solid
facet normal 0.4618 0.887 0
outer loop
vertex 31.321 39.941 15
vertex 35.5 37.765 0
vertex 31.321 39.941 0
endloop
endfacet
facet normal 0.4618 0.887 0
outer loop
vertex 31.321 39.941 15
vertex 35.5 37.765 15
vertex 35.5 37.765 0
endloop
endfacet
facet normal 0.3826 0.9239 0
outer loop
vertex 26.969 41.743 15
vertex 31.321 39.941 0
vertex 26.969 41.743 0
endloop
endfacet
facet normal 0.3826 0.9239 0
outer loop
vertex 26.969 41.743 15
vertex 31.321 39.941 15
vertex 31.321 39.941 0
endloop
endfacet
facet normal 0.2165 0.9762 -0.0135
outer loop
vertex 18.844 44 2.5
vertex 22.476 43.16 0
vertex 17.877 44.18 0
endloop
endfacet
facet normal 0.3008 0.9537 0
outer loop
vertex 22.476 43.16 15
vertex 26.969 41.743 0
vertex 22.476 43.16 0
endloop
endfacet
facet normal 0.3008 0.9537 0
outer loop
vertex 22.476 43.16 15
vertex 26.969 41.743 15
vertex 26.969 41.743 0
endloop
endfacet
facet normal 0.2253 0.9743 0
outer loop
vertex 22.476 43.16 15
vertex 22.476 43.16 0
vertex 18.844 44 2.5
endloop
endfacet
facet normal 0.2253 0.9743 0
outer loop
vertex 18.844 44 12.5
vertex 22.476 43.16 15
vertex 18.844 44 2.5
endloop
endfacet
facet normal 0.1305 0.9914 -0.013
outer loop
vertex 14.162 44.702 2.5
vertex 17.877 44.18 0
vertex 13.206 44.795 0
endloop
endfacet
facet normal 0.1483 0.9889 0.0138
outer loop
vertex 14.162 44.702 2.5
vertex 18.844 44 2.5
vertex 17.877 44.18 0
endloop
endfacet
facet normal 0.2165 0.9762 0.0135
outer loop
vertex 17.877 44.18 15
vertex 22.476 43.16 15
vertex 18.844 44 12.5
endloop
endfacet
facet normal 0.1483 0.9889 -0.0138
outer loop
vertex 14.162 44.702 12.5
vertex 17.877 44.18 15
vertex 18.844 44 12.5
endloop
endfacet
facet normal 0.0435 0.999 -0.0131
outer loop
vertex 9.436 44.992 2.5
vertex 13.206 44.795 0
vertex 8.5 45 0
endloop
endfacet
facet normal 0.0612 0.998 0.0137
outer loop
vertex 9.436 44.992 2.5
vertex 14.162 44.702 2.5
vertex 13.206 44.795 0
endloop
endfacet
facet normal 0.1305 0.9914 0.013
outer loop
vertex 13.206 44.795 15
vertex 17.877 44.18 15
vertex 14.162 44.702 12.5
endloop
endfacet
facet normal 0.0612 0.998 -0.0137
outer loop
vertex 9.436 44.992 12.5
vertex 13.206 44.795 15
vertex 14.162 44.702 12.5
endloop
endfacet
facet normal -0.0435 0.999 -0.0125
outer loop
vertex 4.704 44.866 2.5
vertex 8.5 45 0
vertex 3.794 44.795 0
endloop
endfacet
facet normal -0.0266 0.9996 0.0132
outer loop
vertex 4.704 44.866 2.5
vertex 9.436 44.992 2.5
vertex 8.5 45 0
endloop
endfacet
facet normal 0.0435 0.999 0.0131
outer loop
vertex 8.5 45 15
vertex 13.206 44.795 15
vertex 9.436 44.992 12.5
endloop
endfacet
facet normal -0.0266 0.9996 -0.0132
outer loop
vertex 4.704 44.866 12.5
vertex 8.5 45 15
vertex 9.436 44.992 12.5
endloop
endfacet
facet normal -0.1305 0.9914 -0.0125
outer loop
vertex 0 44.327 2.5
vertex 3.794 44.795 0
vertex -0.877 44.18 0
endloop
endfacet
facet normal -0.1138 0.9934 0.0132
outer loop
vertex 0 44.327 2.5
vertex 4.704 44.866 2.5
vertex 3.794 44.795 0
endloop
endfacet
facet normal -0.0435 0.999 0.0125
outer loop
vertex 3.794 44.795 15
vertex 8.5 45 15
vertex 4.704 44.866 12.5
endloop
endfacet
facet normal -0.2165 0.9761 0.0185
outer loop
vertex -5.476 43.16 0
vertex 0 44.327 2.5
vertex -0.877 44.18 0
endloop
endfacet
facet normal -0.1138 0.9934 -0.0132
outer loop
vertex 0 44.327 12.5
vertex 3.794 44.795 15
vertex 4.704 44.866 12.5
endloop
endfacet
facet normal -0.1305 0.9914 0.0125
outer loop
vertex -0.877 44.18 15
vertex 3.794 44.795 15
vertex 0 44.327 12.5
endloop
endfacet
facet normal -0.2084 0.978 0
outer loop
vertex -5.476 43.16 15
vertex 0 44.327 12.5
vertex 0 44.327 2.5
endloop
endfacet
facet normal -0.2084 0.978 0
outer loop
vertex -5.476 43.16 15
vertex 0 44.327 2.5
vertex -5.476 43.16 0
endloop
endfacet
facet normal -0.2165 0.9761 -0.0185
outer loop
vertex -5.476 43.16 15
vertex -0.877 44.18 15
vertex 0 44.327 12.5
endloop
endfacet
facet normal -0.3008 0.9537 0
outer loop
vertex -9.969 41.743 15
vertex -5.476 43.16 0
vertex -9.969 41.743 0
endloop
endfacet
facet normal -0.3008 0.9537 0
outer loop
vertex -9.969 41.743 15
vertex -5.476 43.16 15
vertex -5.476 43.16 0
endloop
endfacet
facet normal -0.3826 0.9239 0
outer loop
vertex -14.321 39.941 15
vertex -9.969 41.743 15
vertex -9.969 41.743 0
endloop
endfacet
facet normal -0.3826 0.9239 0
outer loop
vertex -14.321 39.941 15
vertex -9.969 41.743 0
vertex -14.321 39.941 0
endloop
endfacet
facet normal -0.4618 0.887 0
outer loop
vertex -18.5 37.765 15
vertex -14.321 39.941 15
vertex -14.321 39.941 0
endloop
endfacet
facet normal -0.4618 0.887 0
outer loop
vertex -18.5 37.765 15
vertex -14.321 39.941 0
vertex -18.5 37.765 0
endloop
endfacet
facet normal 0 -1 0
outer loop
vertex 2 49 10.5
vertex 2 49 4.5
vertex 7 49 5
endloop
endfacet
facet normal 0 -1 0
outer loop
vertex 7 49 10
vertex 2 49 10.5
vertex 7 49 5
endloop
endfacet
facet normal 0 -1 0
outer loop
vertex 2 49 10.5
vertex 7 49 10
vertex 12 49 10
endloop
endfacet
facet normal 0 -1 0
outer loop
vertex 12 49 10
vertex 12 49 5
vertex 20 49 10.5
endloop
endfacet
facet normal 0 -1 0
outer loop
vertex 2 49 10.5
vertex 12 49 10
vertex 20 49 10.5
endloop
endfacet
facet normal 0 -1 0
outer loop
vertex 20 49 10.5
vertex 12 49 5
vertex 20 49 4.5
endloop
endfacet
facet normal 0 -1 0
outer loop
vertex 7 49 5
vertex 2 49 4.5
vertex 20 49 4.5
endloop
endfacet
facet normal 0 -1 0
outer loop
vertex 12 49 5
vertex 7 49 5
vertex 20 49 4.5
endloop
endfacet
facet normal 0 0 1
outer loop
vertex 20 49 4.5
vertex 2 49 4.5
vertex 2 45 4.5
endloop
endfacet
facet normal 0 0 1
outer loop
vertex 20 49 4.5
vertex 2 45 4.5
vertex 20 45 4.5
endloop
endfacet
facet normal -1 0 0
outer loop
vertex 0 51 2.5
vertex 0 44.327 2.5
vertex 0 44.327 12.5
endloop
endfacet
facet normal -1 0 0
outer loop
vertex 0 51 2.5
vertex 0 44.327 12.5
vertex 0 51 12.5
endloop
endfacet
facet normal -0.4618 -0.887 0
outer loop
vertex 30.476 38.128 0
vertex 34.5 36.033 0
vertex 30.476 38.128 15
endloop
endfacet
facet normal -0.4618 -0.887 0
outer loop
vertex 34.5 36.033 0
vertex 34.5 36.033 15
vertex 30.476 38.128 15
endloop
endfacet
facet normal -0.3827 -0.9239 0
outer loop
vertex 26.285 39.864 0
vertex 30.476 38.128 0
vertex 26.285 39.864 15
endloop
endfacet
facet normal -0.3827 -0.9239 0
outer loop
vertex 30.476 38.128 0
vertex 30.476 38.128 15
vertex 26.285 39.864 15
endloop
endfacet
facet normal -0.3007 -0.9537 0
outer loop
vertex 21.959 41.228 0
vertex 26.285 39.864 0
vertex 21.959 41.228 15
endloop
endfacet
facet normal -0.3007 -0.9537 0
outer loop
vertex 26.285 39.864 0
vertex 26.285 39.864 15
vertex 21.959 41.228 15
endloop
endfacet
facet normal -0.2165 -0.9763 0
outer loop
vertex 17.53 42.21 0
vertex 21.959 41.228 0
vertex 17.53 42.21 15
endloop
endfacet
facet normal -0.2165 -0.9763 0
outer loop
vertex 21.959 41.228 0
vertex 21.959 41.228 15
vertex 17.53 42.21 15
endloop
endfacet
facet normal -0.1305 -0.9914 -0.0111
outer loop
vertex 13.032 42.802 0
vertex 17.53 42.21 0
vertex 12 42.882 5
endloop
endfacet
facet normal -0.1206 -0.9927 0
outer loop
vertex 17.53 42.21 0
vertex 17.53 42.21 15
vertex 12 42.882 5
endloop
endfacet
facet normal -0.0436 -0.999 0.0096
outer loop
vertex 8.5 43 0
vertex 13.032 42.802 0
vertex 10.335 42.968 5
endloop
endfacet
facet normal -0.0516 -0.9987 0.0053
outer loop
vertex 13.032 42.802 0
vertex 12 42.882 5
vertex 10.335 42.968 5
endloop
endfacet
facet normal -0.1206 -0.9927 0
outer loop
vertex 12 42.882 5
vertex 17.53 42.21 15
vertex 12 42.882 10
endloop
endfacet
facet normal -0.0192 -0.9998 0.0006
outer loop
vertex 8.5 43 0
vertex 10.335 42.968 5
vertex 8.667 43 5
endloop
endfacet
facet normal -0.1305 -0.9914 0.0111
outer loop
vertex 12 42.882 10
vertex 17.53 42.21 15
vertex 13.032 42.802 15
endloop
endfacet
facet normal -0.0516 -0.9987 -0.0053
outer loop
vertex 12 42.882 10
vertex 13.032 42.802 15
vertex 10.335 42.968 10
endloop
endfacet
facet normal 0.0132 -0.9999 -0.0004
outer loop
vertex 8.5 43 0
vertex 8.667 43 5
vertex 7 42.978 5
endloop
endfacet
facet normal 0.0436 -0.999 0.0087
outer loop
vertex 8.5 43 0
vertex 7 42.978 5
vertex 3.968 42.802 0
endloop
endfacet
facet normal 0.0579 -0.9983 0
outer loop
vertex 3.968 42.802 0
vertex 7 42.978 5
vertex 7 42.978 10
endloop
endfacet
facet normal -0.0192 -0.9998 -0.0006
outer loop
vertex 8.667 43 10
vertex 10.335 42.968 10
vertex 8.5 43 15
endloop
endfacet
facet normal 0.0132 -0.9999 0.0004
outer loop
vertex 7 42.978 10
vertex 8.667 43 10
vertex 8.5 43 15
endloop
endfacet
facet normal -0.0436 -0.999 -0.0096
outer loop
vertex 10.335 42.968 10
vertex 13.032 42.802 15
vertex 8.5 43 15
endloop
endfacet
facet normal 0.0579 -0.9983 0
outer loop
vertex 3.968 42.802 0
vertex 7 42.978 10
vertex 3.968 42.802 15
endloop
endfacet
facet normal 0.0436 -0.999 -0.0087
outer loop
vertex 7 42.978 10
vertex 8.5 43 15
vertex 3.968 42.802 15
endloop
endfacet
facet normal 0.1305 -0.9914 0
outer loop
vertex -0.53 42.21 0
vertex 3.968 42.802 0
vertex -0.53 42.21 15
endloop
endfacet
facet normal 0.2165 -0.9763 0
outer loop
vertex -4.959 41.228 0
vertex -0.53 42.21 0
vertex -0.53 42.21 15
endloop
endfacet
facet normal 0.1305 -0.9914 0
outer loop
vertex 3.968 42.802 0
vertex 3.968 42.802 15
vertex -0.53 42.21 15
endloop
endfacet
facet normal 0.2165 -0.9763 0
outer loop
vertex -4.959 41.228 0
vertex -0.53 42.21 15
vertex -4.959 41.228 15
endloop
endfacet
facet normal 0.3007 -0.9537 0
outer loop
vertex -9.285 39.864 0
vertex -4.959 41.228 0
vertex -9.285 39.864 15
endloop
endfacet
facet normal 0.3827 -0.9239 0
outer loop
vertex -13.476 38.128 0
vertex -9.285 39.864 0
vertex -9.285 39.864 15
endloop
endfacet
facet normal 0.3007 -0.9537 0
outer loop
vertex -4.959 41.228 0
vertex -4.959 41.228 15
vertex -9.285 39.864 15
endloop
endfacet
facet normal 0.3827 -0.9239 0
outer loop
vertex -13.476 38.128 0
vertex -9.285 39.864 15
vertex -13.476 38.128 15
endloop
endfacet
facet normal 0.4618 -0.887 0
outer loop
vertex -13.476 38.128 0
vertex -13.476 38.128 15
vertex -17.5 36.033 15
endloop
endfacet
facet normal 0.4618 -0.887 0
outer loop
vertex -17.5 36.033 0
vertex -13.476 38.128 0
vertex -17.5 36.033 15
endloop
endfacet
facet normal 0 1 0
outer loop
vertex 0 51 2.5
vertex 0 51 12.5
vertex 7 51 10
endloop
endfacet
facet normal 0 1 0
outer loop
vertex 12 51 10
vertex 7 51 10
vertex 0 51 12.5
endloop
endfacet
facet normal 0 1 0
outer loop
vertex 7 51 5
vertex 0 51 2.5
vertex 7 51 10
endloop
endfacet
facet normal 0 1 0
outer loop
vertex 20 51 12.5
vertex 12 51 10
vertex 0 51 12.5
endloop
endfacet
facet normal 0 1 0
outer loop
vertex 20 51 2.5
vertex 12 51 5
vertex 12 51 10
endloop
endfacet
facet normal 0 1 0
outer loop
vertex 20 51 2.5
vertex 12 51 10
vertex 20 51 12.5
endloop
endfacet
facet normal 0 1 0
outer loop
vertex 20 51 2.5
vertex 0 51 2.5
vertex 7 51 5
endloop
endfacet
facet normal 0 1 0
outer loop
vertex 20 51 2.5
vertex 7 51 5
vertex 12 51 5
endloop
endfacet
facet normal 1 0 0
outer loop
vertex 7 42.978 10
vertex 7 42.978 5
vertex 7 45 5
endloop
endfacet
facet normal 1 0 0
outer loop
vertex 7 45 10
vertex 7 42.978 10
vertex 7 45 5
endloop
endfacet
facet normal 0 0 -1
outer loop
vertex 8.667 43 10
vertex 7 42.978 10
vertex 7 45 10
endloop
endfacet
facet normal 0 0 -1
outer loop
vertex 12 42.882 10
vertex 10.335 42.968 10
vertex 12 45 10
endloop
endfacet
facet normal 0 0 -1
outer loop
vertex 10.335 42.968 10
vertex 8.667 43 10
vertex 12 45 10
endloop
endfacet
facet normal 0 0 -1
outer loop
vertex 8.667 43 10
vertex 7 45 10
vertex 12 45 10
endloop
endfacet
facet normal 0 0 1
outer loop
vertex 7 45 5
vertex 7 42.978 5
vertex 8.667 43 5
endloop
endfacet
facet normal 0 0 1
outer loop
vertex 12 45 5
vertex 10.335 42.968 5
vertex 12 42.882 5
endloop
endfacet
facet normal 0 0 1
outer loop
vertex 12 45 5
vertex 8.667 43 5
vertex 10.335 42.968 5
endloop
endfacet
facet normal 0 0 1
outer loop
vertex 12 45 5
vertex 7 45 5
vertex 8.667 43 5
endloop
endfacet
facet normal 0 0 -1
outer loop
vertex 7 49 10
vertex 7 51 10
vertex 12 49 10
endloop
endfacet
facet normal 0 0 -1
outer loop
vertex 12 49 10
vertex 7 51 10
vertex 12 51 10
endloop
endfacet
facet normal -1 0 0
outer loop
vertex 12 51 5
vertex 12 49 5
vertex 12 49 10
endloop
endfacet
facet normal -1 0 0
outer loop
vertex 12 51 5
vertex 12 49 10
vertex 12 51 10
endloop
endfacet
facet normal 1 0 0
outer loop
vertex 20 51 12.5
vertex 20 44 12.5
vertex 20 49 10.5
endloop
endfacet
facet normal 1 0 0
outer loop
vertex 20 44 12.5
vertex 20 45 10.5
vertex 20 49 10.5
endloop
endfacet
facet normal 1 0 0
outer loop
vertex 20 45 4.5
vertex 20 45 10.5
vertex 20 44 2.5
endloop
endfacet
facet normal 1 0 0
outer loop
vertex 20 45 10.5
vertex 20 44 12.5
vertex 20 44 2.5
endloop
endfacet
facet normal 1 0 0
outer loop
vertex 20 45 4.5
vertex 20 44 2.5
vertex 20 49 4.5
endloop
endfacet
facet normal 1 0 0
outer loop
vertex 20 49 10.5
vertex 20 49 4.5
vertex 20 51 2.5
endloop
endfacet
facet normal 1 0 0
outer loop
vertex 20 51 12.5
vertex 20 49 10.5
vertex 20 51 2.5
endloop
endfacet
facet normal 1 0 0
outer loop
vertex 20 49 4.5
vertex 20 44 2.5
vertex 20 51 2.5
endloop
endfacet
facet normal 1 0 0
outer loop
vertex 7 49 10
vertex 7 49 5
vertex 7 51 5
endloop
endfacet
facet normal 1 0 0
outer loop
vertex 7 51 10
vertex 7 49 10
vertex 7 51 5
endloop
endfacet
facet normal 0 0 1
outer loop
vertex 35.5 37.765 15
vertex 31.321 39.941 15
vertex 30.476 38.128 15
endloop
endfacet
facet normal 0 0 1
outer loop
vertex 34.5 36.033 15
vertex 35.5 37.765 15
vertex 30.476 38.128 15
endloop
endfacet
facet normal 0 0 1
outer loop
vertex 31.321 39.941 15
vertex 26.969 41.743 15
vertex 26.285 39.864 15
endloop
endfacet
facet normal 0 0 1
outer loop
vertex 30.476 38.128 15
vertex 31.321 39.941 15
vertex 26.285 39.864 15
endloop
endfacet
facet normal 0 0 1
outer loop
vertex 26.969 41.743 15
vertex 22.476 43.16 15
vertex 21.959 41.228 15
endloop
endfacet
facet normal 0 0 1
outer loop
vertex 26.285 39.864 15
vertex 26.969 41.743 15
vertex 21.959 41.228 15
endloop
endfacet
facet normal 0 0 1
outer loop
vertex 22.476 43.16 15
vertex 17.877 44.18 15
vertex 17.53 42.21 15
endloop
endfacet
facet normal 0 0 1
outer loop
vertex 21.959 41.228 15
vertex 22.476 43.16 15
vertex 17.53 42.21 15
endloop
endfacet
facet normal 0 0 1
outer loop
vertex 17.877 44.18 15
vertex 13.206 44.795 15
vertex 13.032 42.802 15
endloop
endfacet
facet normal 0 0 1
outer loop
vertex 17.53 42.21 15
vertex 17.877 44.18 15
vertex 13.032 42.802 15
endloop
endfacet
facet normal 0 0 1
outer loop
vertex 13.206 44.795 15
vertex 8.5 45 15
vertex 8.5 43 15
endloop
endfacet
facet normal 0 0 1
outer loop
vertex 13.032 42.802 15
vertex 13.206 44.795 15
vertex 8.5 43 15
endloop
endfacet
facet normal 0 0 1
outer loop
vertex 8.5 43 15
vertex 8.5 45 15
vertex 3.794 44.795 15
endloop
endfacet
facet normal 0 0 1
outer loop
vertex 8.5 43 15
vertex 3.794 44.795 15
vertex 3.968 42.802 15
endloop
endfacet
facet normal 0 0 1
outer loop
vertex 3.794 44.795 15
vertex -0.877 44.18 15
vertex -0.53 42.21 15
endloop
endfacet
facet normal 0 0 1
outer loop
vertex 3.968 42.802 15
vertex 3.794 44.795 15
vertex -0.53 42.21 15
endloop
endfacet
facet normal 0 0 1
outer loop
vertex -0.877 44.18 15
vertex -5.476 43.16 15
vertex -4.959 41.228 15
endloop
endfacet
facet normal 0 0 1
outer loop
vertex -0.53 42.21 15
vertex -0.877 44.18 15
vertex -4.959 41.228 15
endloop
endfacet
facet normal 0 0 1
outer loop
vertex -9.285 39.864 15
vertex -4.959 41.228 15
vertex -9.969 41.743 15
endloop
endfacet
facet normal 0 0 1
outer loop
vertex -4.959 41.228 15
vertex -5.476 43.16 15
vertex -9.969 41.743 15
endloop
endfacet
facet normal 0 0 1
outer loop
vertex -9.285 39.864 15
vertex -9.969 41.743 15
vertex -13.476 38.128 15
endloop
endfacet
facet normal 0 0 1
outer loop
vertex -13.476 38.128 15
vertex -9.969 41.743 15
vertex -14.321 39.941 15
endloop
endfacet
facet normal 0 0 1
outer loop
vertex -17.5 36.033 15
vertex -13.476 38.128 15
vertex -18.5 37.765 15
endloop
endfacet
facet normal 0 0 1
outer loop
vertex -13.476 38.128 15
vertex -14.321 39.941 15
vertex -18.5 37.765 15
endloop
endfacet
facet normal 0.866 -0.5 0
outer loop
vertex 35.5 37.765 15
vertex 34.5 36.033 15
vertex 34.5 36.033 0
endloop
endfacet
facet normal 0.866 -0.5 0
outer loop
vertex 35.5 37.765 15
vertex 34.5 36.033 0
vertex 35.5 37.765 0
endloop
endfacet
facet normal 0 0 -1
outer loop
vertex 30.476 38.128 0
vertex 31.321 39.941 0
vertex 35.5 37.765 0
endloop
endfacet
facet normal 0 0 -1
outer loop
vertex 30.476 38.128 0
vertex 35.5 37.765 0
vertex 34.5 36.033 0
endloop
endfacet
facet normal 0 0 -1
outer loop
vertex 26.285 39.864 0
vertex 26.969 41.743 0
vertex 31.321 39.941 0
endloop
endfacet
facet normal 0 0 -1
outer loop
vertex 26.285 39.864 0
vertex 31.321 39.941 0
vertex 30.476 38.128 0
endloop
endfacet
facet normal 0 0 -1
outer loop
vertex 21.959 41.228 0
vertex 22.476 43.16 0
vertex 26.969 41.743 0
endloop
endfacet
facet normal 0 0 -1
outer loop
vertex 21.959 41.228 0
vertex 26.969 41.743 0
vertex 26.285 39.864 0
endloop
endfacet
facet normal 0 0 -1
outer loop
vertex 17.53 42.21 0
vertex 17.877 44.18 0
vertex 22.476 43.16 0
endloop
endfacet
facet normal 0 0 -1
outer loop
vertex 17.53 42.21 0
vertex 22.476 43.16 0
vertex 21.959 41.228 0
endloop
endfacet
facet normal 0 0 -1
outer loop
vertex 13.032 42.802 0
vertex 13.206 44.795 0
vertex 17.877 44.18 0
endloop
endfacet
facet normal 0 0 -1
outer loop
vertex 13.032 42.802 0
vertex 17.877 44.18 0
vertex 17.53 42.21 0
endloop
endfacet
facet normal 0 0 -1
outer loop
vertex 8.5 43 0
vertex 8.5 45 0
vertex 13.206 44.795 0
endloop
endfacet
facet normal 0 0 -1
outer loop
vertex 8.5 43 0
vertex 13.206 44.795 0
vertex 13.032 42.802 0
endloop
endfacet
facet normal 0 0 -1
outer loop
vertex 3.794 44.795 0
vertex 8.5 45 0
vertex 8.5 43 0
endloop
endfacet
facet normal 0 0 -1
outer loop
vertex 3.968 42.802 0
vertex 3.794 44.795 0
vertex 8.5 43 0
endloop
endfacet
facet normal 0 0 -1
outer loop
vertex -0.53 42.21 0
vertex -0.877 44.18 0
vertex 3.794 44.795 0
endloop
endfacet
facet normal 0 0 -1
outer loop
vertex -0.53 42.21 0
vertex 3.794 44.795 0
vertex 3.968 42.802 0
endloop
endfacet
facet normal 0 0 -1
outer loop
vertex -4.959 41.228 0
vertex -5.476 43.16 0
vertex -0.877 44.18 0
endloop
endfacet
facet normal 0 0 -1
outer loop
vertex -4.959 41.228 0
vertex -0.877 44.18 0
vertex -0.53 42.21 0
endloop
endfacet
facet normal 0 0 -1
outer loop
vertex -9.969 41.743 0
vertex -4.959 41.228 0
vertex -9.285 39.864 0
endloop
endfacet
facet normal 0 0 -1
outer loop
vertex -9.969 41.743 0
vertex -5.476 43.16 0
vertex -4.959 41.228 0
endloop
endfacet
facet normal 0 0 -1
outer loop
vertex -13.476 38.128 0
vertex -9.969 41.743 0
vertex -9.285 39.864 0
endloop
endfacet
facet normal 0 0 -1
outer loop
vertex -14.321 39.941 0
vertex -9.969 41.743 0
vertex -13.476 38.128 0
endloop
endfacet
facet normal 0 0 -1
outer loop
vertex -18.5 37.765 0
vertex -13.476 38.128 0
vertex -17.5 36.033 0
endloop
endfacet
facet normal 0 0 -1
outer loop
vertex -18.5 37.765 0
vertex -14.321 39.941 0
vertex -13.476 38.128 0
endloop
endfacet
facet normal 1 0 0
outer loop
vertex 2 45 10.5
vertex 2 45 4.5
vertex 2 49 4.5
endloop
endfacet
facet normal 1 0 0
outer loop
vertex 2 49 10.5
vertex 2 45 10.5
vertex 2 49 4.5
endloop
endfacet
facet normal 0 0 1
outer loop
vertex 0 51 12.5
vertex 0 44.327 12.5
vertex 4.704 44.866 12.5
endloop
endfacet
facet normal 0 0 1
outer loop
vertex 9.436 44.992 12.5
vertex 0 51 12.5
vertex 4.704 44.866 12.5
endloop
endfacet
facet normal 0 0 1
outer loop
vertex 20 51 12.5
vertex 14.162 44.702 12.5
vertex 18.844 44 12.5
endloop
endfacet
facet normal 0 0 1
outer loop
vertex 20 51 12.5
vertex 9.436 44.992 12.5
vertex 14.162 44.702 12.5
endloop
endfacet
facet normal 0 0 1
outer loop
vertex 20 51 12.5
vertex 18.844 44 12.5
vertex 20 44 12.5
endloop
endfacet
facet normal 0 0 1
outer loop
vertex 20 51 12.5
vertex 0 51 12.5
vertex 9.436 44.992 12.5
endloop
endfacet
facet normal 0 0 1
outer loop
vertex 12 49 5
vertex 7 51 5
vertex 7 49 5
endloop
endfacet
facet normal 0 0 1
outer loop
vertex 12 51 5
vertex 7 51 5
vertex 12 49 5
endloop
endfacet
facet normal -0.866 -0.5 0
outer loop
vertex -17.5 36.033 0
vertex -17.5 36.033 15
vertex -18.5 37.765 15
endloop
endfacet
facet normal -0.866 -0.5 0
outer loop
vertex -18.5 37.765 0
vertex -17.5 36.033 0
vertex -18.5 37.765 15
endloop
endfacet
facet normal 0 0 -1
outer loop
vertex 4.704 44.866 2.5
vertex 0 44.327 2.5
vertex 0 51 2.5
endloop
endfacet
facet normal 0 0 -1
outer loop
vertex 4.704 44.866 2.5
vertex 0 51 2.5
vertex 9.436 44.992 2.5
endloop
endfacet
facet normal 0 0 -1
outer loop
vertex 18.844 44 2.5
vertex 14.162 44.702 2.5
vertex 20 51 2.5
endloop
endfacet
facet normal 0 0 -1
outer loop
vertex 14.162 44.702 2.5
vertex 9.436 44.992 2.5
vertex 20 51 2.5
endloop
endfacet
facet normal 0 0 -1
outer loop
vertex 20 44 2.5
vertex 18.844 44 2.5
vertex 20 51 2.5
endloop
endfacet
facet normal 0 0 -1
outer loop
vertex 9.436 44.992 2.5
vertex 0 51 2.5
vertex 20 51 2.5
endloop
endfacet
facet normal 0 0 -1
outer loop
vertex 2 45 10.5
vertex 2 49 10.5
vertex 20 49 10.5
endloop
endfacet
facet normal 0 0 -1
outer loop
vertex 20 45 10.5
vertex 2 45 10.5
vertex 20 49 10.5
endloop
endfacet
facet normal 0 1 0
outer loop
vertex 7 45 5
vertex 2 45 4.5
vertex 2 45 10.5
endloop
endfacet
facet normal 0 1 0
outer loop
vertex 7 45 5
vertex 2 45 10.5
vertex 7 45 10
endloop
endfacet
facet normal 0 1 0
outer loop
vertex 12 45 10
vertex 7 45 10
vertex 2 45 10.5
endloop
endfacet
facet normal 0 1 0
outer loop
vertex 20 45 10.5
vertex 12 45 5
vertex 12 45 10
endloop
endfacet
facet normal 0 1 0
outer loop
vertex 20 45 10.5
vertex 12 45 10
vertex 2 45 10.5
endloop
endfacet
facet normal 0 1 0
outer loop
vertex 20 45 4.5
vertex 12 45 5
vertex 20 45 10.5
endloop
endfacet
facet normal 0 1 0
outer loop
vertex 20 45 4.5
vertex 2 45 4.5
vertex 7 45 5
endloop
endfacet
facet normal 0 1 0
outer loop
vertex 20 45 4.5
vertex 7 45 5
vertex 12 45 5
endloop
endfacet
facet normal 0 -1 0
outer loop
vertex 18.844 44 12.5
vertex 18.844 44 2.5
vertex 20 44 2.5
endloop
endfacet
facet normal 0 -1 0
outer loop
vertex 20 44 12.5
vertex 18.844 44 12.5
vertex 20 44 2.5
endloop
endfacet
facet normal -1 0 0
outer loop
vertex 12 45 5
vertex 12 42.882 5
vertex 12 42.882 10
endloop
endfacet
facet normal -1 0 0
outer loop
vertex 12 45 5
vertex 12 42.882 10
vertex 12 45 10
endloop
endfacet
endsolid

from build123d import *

# Parameters (mm, degrees)
BOX002_W                    = 20
BOX002_H                    = 4
BOX002_DEPTH                = 6
BOX_W                       = 5
BOX_H                       = 20
BOX_DEPTH                   = 5
BOX001_W                    = 20
BOX001_H                    = 7
BOX001_DEPTH                = 10
CYLINDER001_W               = 52
CYLINDER001_H               = 15
CYLINDER001_ANGLE           = 60
CYLINDER001_PLACEMENT_ANGLE = 60
CYLINDER_W                  = 54
CYLINDER_H                  = 15
CYLINDER_ANGLE              = 60
CYLINDER_PLACEMENT_ANGLE    = 60


with BuildPart() as slot:
    # Box002 → Box002 (new body)
    with BuildSketch(Plane(origin=(2, 45, 4.5), x_dir=(1, 0, 0), z_dir=(0, 0, 1))):
        with Locations((10, 2)):
            Rectangle(BOX002_W, BOX002_H)
    extrude(amount=BOX002_DEPTH)


with BuildPart() as pin_opening:
    # Box → Box (new body)
    with BuildSketch(Plane(origin=(7, 42, 5), x_dir=(1, 0, 0), z_dir=(0, 0, 1))):
        with Locations((2.5, 10)):
            Rectangle(BOX_W, BOX_H)
    extrude(amount=BOX_DEPTH)


with BuildPart() as latch:
    # Box001 → Box001 (new body)
    with BuildSketch(Plane(origin=(0, 44, 2.5), x_dir=(1, 0, 0), z_dir=(0, 0, 1))):
        with Locations((10, 3.5)):
            Rectangle(BOX001_W, BOX001_H)
    extrude(amount=BOX001_DEPTH)


with BuildPart() as bottle_wall001:
    # Cylinder001 → Cylinder001 (revolve)
    with BuildSketch(Plane.XZ):
        with Locations((26, 7.5)):
            Rectangle(CYLINDER001_W, CYLINDER001_H)
    revolve(axis=Axis((0, 0, 0), (0, 0, 1)), revolution_arc=CYLINDER001_ANGLE)


with BuildPart() as bottle_wall001_1:
    # Cylinder001 placement: moved
    add(bottle_wall001.part.moved(Location((8.5, -7, 0))).rotate(Axis((8.5, -7, 0), (0, 0, 1)), CYLINDER001_PLACEMENT_ANGLE))


with BuildPart() as cut002:
    # Cylinder → Cylinder (revolve)
    with BuildSketch(Plane.XZ):
        with Locations((27, 7.5)):
            Rectangle(CYLINDER_W, CYLINDER_H)
    revolve(axis=Axis((0, 0, 0), (0, 0, 1)), revolution_arc=CYLINDER_ANGLE)


with BuildPart() as cut002_1:
    # Cylinder placement: moved
    add(cut002.part.moved(Location((8.5, -7, 0))).rotate(Axis((8.5, -7, 0), (0, 0, 1)), CYLINDER_PLACEMENT_ANGLE))

    # Cut: cut bottle_wall001
    add(bottle_wall001_1.part, mode=Mode.SUBTRACT)


with BuildPart() as cut002_2:
    # Cut placement: moved
    add(cut002_1.part.moved(Location((0, -2, 0))))

    # Fusion: union latch
    add(latch.part)

    # Fusion001: union latch
    add(latch.part)

    # Cut001: cut pin_opening
    add(pin_opening.part, mode=Mode.SUBTRACT)

    # Cut002: cut slot
    add(slot.part, mode=Mode.SUBTRACT)


solid = cut002_2.part
